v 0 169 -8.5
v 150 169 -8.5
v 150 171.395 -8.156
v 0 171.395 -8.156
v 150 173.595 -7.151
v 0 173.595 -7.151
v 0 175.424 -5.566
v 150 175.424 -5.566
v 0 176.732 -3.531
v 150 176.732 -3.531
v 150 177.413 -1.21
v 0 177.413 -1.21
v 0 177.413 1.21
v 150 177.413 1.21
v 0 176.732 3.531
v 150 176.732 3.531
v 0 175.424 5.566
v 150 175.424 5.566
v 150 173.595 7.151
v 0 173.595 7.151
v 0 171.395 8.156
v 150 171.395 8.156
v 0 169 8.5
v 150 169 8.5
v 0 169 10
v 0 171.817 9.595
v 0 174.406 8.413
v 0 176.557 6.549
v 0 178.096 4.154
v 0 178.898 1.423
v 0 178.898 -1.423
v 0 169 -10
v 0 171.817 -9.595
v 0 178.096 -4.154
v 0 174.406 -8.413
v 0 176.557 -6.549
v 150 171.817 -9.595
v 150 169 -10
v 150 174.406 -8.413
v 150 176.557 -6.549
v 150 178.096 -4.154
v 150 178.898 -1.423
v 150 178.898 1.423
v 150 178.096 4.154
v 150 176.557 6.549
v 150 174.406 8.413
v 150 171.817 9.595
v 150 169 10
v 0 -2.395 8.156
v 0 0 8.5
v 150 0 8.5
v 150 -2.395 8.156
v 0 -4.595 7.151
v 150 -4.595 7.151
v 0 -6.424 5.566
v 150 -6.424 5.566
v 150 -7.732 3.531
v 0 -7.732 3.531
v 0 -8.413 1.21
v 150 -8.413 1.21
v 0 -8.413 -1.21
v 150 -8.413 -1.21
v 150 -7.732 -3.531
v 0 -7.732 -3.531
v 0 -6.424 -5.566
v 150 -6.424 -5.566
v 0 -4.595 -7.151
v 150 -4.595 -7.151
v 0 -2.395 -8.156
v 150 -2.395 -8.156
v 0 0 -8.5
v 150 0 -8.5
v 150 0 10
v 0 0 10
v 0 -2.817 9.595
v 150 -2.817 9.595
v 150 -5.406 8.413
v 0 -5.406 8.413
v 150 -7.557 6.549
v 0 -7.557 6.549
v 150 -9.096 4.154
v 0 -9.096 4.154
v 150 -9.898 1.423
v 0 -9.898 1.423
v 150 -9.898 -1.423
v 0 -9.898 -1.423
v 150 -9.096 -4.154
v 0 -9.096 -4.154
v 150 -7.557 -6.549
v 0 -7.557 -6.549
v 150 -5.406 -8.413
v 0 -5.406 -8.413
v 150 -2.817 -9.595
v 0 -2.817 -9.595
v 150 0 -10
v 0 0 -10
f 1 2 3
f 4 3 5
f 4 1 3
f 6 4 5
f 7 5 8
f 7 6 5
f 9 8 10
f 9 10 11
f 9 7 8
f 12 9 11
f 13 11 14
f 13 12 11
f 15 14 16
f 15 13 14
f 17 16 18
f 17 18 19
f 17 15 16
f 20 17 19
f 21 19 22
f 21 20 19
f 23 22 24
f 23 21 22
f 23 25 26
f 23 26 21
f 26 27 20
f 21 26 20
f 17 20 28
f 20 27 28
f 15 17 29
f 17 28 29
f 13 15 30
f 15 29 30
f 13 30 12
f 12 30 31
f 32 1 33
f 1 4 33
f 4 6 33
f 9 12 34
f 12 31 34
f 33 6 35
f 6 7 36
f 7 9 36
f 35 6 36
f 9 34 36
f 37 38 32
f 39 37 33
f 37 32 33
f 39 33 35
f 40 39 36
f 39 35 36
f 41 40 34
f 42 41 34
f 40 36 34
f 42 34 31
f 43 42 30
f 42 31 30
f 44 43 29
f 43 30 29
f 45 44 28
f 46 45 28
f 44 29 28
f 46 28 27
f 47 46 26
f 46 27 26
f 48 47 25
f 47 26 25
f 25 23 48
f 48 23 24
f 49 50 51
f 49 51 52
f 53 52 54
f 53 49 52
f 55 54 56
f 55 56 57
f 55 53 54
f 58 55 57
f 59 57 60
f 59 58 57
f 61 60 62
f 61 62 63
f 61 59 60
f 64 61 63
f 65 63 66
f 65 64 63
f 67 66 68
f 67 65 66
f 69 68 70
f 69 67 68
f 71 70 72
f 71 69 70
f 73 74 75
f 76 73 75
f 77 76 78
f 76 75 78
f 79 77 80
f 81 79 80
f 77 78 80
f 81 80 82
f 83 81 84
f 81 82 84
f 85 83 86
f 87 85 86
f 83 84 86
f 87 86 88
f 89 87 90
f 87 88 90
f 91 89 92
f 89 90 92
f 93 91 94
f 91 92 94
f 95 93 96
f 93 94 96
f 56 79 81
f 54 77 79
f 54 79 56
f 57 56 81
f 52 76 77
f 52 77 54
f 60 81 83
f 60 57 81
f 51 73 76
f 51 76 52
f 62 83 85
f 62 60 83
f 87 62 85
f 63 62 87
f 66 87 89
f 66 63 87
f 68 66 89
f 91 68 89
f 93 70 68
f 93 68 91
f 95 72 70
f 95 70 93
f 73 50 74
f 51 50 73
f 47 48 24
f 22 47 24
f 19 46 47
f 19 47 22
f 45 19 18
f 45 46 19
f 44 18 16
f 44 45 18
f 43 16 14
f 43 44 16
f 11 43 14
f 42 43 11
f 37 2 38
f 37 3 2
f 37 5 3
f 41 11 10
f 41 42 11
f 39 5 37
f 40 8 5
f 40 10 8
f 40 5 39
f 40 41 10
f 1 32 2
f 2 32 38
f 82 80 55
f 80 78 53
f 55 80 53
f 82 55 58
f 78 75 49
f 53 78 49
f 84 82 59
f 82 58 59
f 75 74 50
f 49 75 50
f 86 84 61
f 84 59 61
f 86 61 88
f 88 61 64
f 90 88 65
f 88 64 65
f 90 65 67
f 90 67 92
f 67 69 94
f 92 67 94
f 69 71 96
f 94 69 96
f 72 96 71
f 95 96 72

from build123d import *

# Parameters (mm, degrees)
BOX003_W      = 150
BOX003_H      = 169
BOX003_DEPTH  = 22
TUBE001_R     = 10
TUBE001_R_2   = 8.5
TUBE001_DEPTH = 150
TUBE_R        = 10
TUBE_R_2      = 8.5
TUBE_DEPTH    = 150


with BuildPart() as cube:
    # Box003 → Box003 (new body)
    with BuildSketch(Plane.XY.offset(-11)):
        with Locations((75, 84.5)):
            Rectangle(BOX003_W, BOX003_H)
    extrude(amount=BOX003_DEPTH)


with BuildPart() as rightcurve:
    # Tube001 → Tube001 (new body)
    with BuildSketch(Plane(origin=(0, 169, 0), x_dir=(0, 0, -1), z_dir=(1, 0, 0))):
        Circle(TUBE001_R)
        Circle(TUBE001_R_2, mode=Mode.SUBTRACT)
    extrude(amount=TUBE001_DEPTH)


with BuildPart() as cut:
    # Tube → Tube (new body)
    with BuildSketch(Plane(origin=(0, 0, 0), x_dir=(0, 0, -1), z_dir=(1, 0, 0))):
        Circle(TUBE_R)
        Circle(TUBE_R_2, mode=Mode.SUBTRACT)
    extrude(amount=TUBE_DEPTH)

    # Fusion002: union RightCurve
    add(rightcurve.part)

    # Cut: cut Cube
    add(cube.part, mode=Mode.SUBTRACT)


solid = cut.part
